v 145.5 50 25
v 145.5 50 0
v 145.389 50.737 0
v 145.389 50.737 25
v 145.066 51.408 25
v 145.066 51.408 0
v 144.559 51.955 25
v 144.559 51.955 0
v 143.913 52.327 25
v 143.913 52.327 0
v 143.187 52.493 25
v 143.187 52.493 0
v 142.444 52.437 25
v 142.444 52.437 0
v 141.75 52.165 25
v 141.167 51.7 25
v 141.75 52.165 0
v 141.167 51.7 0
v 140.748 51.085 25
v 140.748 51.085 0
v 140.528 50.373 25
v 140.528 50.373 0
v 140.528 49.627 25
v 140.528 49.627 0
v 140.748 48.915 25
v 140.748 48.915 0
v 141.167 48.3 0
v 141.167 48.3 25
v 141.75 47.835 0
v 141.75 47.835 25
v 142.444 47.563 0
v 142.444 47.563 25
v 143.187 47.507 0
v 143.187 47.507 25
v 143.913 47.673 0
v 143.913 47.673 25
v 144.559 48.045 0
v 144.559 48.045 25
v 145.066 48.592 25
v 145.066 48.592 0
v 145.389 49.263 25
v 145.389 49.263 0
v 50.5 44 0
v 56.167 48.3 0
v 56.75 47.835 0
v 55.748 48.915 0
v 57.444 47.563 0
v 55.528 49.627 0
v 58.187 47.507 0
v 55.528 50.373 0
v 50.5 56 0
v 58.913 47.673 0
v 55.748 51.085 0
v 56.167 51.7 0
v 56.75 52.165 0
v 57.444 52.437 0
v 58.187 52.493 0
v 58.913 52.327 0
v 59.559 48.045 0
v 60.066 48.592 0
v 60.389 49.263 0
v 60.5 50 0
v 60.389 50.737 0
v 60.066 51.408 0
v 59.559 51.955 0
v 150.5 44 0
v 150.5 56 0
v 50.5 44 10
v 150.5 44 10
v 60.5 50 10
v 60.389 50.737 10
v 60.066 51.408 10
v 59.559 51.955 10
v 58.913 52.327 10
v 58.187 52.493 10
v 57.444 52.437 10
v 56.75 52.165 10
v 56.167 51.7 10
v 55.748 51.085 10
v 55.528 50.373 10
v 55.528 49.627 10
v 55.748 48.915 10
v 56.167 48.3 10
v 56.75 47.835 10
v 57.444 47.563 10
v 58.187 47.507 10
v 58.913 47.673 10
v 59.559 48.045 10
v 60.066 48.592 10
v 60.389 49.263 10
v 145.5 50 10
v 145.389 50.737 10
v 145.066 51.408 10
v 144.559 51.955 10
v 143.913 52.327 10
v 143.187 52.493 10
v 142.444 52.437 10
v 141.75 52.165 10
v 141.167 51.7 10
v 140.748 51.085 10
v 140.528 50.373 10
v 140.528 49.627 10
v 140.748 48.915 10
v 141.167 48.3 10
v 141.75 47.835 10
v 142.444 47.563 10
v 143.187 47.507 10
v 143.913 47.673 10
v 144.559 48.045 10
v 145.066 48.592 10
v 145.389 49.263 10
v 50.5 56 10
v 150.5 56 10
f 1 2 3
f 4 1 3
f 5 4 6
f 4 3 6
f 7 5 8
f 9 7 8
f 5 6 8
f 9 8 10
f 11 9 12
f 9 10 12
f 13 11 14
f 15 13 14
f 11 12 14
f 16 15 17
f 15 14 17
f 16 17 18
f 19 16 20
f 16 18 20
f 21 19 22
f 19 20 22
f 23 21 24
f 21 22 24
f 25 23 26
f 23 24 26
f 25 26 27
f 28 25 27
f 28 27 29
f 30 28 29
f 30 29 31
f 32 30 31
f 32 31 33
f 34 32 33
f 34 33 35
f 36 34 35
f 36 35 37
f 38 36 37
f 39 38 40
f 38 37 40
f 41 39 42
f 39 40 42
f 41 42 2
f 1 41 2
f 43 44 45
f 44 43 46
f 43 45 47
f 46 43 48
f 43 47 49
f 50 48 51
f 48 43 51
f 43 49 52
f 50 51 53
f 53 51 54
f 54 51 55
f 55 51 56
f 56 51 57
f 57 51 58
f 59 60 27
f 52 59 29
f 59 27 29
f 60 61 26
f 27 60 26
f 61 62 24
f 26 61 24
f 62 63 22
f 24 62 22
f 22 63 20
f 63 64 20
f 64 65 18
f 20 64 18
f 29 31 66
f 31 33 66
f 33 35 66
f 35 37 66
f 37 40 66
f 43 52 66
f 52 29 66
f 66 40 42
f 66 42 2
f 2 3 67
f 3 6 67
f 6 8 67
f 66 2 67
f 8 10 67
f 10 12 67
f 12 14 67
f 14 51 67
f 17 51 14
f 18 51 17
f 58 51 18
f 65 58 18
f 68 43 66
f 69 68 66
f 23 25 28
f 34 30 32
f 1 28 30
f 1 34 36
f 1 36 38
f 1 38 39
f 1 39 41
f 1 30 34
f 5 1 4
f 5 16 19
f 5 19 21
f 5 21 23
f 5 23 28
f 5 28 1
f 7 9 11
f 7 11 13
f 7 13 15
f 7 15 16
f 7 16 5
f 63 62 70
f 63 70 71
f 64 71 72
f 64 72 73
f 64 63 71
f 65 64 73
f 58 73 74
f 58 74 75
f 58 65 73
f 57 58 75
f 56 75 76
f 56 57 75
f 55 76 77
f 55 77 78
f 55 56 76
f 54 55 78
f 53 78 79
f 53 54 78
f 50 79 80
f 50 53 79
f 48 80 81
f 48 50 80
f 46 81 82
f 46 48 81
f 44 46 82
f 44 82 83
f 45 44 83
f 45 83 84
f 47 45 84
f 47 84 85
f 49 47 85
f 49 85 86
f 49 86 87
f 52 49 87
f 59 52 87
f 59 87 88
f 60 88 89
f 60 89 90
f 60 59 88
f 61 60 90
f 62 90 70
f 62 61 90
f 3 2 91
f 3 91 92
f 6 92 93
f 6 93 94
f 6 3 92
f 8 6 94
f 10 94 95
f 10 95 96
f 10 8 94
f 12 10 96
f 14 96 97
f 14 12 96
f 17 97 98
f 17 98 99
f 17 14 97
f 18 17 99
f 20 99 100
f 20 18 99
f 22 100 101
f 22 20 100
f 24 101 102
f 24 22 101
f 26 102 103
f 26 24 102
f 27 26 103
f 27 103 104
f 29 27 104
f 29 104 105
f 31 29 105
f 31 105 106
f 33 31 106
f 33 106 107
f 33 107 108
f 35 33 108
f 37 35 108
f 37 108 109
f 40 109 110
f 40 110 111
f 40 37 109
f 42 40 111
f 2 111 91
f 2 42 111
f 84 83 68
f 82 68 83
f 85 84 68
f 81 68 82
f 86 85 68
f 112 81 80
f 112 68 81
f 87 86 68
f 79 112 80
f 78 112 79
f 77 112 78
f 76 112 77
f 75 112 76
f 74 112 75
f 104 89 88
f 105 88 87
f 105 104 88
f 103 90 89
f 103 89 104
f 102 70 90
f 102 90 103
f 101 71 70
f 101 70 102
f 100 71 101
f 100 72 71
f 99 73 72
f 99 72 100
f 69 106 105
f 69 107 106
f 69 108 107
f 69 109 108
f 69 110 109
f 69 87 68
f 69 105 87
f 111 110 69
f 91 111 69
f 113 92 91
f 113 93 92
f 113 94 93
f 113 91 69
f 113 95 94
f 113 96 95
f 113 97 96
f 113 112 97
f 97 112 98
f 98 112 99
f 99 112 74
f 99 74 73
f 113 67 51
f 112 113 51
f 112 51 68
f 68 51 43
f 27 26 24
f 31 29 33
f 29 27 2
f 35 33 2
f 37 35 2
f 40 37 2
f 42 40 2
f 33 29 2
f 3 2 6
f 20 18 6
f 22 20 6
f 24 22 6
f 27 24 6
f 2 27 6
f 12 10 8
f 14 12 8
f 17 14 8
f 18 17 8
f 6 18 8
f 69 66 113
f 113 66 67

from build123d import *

# Parameters (mm, degrees)
F0_R     = 4
F0_R_2   = 2.5
F1_DEPTH = 10
F2_DEPTH = 25


with BuildPart() as f1:
    # F0 (on Top) → F1 (new body)
    with BuildSketch(Plane.XY):
        with BuildLine():
            ThreePointArc((113.5607177772, 44), (112.5, 50), (113.5607177772, 56))
            Line((113.5607177772, 56), (73.5, 56))
            Line((73.5, 56), (73.5, 44))
            Line((73.5, 44), (113.5607177772, 44))
        make_face()
        with BuildLine():
            ThreePointArc((146.4392822228, 44), (147.2327803749, 46.9534805842), (147.5, 50))
            ThreePointArc((147.5, 50), (147.2327803749, 53.0465194158), (146.4392822228, 56))
            Line((146.4392822228, 56), (113.5607177772, 56))
            ThreePointArc((113.5607177772, 56), (112.5, 50), (113.5607177772, 44))
            Line((113.5607177772, 44), (146.4392822228, 44))
        make_face()
        with Locations((130, 50)):
            Circle(F0_R, mode=Mode.SUBTRACT)
        with Locations((143, 50)):
            Circle(F0_R_2, mode=Mode.SUBTRACT)
        with BuildLine():
            Line((73.5, 44), (73.5, 56))
            Line((73.5, 56), (50.5, 56))
            Line((50.5, 56), (50.5, 52.1794494718))
            ThreePointArc((50.5, 52.1794494718), (50.8733971724, 51.1180339887), (51, 50))
            ThreePointArc((51, 50), (50.8733971724, 48.8819660113), (50.5, 47.8205505282))
            Line((50.5, 47.8205505282), (50.5, 44))
            Line((50.5, 44), (73.5, 44))
        make_face()
        with Locations((58, 50)):
            Circle(F0_R_2, mode=Mode.SUBTRACT)
        with Locations((130, 50)):
            Circle(F0_R)
        with BuildLine():
            ThreePointArc((146.4392822228, 56), (147.2327803749, 53.0465194158), (147.5, 50))
            ThreePointArc((147.5, 50), (147.2327803749, 46.9534805842), (146.4392822228, 44))
            Line((146.4392822228, 44), (150.5, 44))
            Line((150.5, 44), (150.5, 56))
            Line((150.5, 56), (146.4392822228, 56))
        make_face()
        with BuildLine():
            ThreePointArc((51, 50), (50.8733971724, 51.1180339887), (50.5, 52.1794494718))
            Line((50.5, 52.1794494718), (50.5, 47.8205505282))
            ThreePointArc((50.5, 47.8205505282), (50.8733971724, 48.8819660113), (51, 50))
        make_face()
    extrude(amount=F1_DEPTH)


with BuildPart() as f2:
    # F0 (on Top) → F2 (new body)
    with BuildSketch(Plane.XY):
        with Locations((143, 50)):
            Circle(F0_R_2)
    extrude(amount=F2_DEPTH)


solid = Compound([f1.part, f2.part])
